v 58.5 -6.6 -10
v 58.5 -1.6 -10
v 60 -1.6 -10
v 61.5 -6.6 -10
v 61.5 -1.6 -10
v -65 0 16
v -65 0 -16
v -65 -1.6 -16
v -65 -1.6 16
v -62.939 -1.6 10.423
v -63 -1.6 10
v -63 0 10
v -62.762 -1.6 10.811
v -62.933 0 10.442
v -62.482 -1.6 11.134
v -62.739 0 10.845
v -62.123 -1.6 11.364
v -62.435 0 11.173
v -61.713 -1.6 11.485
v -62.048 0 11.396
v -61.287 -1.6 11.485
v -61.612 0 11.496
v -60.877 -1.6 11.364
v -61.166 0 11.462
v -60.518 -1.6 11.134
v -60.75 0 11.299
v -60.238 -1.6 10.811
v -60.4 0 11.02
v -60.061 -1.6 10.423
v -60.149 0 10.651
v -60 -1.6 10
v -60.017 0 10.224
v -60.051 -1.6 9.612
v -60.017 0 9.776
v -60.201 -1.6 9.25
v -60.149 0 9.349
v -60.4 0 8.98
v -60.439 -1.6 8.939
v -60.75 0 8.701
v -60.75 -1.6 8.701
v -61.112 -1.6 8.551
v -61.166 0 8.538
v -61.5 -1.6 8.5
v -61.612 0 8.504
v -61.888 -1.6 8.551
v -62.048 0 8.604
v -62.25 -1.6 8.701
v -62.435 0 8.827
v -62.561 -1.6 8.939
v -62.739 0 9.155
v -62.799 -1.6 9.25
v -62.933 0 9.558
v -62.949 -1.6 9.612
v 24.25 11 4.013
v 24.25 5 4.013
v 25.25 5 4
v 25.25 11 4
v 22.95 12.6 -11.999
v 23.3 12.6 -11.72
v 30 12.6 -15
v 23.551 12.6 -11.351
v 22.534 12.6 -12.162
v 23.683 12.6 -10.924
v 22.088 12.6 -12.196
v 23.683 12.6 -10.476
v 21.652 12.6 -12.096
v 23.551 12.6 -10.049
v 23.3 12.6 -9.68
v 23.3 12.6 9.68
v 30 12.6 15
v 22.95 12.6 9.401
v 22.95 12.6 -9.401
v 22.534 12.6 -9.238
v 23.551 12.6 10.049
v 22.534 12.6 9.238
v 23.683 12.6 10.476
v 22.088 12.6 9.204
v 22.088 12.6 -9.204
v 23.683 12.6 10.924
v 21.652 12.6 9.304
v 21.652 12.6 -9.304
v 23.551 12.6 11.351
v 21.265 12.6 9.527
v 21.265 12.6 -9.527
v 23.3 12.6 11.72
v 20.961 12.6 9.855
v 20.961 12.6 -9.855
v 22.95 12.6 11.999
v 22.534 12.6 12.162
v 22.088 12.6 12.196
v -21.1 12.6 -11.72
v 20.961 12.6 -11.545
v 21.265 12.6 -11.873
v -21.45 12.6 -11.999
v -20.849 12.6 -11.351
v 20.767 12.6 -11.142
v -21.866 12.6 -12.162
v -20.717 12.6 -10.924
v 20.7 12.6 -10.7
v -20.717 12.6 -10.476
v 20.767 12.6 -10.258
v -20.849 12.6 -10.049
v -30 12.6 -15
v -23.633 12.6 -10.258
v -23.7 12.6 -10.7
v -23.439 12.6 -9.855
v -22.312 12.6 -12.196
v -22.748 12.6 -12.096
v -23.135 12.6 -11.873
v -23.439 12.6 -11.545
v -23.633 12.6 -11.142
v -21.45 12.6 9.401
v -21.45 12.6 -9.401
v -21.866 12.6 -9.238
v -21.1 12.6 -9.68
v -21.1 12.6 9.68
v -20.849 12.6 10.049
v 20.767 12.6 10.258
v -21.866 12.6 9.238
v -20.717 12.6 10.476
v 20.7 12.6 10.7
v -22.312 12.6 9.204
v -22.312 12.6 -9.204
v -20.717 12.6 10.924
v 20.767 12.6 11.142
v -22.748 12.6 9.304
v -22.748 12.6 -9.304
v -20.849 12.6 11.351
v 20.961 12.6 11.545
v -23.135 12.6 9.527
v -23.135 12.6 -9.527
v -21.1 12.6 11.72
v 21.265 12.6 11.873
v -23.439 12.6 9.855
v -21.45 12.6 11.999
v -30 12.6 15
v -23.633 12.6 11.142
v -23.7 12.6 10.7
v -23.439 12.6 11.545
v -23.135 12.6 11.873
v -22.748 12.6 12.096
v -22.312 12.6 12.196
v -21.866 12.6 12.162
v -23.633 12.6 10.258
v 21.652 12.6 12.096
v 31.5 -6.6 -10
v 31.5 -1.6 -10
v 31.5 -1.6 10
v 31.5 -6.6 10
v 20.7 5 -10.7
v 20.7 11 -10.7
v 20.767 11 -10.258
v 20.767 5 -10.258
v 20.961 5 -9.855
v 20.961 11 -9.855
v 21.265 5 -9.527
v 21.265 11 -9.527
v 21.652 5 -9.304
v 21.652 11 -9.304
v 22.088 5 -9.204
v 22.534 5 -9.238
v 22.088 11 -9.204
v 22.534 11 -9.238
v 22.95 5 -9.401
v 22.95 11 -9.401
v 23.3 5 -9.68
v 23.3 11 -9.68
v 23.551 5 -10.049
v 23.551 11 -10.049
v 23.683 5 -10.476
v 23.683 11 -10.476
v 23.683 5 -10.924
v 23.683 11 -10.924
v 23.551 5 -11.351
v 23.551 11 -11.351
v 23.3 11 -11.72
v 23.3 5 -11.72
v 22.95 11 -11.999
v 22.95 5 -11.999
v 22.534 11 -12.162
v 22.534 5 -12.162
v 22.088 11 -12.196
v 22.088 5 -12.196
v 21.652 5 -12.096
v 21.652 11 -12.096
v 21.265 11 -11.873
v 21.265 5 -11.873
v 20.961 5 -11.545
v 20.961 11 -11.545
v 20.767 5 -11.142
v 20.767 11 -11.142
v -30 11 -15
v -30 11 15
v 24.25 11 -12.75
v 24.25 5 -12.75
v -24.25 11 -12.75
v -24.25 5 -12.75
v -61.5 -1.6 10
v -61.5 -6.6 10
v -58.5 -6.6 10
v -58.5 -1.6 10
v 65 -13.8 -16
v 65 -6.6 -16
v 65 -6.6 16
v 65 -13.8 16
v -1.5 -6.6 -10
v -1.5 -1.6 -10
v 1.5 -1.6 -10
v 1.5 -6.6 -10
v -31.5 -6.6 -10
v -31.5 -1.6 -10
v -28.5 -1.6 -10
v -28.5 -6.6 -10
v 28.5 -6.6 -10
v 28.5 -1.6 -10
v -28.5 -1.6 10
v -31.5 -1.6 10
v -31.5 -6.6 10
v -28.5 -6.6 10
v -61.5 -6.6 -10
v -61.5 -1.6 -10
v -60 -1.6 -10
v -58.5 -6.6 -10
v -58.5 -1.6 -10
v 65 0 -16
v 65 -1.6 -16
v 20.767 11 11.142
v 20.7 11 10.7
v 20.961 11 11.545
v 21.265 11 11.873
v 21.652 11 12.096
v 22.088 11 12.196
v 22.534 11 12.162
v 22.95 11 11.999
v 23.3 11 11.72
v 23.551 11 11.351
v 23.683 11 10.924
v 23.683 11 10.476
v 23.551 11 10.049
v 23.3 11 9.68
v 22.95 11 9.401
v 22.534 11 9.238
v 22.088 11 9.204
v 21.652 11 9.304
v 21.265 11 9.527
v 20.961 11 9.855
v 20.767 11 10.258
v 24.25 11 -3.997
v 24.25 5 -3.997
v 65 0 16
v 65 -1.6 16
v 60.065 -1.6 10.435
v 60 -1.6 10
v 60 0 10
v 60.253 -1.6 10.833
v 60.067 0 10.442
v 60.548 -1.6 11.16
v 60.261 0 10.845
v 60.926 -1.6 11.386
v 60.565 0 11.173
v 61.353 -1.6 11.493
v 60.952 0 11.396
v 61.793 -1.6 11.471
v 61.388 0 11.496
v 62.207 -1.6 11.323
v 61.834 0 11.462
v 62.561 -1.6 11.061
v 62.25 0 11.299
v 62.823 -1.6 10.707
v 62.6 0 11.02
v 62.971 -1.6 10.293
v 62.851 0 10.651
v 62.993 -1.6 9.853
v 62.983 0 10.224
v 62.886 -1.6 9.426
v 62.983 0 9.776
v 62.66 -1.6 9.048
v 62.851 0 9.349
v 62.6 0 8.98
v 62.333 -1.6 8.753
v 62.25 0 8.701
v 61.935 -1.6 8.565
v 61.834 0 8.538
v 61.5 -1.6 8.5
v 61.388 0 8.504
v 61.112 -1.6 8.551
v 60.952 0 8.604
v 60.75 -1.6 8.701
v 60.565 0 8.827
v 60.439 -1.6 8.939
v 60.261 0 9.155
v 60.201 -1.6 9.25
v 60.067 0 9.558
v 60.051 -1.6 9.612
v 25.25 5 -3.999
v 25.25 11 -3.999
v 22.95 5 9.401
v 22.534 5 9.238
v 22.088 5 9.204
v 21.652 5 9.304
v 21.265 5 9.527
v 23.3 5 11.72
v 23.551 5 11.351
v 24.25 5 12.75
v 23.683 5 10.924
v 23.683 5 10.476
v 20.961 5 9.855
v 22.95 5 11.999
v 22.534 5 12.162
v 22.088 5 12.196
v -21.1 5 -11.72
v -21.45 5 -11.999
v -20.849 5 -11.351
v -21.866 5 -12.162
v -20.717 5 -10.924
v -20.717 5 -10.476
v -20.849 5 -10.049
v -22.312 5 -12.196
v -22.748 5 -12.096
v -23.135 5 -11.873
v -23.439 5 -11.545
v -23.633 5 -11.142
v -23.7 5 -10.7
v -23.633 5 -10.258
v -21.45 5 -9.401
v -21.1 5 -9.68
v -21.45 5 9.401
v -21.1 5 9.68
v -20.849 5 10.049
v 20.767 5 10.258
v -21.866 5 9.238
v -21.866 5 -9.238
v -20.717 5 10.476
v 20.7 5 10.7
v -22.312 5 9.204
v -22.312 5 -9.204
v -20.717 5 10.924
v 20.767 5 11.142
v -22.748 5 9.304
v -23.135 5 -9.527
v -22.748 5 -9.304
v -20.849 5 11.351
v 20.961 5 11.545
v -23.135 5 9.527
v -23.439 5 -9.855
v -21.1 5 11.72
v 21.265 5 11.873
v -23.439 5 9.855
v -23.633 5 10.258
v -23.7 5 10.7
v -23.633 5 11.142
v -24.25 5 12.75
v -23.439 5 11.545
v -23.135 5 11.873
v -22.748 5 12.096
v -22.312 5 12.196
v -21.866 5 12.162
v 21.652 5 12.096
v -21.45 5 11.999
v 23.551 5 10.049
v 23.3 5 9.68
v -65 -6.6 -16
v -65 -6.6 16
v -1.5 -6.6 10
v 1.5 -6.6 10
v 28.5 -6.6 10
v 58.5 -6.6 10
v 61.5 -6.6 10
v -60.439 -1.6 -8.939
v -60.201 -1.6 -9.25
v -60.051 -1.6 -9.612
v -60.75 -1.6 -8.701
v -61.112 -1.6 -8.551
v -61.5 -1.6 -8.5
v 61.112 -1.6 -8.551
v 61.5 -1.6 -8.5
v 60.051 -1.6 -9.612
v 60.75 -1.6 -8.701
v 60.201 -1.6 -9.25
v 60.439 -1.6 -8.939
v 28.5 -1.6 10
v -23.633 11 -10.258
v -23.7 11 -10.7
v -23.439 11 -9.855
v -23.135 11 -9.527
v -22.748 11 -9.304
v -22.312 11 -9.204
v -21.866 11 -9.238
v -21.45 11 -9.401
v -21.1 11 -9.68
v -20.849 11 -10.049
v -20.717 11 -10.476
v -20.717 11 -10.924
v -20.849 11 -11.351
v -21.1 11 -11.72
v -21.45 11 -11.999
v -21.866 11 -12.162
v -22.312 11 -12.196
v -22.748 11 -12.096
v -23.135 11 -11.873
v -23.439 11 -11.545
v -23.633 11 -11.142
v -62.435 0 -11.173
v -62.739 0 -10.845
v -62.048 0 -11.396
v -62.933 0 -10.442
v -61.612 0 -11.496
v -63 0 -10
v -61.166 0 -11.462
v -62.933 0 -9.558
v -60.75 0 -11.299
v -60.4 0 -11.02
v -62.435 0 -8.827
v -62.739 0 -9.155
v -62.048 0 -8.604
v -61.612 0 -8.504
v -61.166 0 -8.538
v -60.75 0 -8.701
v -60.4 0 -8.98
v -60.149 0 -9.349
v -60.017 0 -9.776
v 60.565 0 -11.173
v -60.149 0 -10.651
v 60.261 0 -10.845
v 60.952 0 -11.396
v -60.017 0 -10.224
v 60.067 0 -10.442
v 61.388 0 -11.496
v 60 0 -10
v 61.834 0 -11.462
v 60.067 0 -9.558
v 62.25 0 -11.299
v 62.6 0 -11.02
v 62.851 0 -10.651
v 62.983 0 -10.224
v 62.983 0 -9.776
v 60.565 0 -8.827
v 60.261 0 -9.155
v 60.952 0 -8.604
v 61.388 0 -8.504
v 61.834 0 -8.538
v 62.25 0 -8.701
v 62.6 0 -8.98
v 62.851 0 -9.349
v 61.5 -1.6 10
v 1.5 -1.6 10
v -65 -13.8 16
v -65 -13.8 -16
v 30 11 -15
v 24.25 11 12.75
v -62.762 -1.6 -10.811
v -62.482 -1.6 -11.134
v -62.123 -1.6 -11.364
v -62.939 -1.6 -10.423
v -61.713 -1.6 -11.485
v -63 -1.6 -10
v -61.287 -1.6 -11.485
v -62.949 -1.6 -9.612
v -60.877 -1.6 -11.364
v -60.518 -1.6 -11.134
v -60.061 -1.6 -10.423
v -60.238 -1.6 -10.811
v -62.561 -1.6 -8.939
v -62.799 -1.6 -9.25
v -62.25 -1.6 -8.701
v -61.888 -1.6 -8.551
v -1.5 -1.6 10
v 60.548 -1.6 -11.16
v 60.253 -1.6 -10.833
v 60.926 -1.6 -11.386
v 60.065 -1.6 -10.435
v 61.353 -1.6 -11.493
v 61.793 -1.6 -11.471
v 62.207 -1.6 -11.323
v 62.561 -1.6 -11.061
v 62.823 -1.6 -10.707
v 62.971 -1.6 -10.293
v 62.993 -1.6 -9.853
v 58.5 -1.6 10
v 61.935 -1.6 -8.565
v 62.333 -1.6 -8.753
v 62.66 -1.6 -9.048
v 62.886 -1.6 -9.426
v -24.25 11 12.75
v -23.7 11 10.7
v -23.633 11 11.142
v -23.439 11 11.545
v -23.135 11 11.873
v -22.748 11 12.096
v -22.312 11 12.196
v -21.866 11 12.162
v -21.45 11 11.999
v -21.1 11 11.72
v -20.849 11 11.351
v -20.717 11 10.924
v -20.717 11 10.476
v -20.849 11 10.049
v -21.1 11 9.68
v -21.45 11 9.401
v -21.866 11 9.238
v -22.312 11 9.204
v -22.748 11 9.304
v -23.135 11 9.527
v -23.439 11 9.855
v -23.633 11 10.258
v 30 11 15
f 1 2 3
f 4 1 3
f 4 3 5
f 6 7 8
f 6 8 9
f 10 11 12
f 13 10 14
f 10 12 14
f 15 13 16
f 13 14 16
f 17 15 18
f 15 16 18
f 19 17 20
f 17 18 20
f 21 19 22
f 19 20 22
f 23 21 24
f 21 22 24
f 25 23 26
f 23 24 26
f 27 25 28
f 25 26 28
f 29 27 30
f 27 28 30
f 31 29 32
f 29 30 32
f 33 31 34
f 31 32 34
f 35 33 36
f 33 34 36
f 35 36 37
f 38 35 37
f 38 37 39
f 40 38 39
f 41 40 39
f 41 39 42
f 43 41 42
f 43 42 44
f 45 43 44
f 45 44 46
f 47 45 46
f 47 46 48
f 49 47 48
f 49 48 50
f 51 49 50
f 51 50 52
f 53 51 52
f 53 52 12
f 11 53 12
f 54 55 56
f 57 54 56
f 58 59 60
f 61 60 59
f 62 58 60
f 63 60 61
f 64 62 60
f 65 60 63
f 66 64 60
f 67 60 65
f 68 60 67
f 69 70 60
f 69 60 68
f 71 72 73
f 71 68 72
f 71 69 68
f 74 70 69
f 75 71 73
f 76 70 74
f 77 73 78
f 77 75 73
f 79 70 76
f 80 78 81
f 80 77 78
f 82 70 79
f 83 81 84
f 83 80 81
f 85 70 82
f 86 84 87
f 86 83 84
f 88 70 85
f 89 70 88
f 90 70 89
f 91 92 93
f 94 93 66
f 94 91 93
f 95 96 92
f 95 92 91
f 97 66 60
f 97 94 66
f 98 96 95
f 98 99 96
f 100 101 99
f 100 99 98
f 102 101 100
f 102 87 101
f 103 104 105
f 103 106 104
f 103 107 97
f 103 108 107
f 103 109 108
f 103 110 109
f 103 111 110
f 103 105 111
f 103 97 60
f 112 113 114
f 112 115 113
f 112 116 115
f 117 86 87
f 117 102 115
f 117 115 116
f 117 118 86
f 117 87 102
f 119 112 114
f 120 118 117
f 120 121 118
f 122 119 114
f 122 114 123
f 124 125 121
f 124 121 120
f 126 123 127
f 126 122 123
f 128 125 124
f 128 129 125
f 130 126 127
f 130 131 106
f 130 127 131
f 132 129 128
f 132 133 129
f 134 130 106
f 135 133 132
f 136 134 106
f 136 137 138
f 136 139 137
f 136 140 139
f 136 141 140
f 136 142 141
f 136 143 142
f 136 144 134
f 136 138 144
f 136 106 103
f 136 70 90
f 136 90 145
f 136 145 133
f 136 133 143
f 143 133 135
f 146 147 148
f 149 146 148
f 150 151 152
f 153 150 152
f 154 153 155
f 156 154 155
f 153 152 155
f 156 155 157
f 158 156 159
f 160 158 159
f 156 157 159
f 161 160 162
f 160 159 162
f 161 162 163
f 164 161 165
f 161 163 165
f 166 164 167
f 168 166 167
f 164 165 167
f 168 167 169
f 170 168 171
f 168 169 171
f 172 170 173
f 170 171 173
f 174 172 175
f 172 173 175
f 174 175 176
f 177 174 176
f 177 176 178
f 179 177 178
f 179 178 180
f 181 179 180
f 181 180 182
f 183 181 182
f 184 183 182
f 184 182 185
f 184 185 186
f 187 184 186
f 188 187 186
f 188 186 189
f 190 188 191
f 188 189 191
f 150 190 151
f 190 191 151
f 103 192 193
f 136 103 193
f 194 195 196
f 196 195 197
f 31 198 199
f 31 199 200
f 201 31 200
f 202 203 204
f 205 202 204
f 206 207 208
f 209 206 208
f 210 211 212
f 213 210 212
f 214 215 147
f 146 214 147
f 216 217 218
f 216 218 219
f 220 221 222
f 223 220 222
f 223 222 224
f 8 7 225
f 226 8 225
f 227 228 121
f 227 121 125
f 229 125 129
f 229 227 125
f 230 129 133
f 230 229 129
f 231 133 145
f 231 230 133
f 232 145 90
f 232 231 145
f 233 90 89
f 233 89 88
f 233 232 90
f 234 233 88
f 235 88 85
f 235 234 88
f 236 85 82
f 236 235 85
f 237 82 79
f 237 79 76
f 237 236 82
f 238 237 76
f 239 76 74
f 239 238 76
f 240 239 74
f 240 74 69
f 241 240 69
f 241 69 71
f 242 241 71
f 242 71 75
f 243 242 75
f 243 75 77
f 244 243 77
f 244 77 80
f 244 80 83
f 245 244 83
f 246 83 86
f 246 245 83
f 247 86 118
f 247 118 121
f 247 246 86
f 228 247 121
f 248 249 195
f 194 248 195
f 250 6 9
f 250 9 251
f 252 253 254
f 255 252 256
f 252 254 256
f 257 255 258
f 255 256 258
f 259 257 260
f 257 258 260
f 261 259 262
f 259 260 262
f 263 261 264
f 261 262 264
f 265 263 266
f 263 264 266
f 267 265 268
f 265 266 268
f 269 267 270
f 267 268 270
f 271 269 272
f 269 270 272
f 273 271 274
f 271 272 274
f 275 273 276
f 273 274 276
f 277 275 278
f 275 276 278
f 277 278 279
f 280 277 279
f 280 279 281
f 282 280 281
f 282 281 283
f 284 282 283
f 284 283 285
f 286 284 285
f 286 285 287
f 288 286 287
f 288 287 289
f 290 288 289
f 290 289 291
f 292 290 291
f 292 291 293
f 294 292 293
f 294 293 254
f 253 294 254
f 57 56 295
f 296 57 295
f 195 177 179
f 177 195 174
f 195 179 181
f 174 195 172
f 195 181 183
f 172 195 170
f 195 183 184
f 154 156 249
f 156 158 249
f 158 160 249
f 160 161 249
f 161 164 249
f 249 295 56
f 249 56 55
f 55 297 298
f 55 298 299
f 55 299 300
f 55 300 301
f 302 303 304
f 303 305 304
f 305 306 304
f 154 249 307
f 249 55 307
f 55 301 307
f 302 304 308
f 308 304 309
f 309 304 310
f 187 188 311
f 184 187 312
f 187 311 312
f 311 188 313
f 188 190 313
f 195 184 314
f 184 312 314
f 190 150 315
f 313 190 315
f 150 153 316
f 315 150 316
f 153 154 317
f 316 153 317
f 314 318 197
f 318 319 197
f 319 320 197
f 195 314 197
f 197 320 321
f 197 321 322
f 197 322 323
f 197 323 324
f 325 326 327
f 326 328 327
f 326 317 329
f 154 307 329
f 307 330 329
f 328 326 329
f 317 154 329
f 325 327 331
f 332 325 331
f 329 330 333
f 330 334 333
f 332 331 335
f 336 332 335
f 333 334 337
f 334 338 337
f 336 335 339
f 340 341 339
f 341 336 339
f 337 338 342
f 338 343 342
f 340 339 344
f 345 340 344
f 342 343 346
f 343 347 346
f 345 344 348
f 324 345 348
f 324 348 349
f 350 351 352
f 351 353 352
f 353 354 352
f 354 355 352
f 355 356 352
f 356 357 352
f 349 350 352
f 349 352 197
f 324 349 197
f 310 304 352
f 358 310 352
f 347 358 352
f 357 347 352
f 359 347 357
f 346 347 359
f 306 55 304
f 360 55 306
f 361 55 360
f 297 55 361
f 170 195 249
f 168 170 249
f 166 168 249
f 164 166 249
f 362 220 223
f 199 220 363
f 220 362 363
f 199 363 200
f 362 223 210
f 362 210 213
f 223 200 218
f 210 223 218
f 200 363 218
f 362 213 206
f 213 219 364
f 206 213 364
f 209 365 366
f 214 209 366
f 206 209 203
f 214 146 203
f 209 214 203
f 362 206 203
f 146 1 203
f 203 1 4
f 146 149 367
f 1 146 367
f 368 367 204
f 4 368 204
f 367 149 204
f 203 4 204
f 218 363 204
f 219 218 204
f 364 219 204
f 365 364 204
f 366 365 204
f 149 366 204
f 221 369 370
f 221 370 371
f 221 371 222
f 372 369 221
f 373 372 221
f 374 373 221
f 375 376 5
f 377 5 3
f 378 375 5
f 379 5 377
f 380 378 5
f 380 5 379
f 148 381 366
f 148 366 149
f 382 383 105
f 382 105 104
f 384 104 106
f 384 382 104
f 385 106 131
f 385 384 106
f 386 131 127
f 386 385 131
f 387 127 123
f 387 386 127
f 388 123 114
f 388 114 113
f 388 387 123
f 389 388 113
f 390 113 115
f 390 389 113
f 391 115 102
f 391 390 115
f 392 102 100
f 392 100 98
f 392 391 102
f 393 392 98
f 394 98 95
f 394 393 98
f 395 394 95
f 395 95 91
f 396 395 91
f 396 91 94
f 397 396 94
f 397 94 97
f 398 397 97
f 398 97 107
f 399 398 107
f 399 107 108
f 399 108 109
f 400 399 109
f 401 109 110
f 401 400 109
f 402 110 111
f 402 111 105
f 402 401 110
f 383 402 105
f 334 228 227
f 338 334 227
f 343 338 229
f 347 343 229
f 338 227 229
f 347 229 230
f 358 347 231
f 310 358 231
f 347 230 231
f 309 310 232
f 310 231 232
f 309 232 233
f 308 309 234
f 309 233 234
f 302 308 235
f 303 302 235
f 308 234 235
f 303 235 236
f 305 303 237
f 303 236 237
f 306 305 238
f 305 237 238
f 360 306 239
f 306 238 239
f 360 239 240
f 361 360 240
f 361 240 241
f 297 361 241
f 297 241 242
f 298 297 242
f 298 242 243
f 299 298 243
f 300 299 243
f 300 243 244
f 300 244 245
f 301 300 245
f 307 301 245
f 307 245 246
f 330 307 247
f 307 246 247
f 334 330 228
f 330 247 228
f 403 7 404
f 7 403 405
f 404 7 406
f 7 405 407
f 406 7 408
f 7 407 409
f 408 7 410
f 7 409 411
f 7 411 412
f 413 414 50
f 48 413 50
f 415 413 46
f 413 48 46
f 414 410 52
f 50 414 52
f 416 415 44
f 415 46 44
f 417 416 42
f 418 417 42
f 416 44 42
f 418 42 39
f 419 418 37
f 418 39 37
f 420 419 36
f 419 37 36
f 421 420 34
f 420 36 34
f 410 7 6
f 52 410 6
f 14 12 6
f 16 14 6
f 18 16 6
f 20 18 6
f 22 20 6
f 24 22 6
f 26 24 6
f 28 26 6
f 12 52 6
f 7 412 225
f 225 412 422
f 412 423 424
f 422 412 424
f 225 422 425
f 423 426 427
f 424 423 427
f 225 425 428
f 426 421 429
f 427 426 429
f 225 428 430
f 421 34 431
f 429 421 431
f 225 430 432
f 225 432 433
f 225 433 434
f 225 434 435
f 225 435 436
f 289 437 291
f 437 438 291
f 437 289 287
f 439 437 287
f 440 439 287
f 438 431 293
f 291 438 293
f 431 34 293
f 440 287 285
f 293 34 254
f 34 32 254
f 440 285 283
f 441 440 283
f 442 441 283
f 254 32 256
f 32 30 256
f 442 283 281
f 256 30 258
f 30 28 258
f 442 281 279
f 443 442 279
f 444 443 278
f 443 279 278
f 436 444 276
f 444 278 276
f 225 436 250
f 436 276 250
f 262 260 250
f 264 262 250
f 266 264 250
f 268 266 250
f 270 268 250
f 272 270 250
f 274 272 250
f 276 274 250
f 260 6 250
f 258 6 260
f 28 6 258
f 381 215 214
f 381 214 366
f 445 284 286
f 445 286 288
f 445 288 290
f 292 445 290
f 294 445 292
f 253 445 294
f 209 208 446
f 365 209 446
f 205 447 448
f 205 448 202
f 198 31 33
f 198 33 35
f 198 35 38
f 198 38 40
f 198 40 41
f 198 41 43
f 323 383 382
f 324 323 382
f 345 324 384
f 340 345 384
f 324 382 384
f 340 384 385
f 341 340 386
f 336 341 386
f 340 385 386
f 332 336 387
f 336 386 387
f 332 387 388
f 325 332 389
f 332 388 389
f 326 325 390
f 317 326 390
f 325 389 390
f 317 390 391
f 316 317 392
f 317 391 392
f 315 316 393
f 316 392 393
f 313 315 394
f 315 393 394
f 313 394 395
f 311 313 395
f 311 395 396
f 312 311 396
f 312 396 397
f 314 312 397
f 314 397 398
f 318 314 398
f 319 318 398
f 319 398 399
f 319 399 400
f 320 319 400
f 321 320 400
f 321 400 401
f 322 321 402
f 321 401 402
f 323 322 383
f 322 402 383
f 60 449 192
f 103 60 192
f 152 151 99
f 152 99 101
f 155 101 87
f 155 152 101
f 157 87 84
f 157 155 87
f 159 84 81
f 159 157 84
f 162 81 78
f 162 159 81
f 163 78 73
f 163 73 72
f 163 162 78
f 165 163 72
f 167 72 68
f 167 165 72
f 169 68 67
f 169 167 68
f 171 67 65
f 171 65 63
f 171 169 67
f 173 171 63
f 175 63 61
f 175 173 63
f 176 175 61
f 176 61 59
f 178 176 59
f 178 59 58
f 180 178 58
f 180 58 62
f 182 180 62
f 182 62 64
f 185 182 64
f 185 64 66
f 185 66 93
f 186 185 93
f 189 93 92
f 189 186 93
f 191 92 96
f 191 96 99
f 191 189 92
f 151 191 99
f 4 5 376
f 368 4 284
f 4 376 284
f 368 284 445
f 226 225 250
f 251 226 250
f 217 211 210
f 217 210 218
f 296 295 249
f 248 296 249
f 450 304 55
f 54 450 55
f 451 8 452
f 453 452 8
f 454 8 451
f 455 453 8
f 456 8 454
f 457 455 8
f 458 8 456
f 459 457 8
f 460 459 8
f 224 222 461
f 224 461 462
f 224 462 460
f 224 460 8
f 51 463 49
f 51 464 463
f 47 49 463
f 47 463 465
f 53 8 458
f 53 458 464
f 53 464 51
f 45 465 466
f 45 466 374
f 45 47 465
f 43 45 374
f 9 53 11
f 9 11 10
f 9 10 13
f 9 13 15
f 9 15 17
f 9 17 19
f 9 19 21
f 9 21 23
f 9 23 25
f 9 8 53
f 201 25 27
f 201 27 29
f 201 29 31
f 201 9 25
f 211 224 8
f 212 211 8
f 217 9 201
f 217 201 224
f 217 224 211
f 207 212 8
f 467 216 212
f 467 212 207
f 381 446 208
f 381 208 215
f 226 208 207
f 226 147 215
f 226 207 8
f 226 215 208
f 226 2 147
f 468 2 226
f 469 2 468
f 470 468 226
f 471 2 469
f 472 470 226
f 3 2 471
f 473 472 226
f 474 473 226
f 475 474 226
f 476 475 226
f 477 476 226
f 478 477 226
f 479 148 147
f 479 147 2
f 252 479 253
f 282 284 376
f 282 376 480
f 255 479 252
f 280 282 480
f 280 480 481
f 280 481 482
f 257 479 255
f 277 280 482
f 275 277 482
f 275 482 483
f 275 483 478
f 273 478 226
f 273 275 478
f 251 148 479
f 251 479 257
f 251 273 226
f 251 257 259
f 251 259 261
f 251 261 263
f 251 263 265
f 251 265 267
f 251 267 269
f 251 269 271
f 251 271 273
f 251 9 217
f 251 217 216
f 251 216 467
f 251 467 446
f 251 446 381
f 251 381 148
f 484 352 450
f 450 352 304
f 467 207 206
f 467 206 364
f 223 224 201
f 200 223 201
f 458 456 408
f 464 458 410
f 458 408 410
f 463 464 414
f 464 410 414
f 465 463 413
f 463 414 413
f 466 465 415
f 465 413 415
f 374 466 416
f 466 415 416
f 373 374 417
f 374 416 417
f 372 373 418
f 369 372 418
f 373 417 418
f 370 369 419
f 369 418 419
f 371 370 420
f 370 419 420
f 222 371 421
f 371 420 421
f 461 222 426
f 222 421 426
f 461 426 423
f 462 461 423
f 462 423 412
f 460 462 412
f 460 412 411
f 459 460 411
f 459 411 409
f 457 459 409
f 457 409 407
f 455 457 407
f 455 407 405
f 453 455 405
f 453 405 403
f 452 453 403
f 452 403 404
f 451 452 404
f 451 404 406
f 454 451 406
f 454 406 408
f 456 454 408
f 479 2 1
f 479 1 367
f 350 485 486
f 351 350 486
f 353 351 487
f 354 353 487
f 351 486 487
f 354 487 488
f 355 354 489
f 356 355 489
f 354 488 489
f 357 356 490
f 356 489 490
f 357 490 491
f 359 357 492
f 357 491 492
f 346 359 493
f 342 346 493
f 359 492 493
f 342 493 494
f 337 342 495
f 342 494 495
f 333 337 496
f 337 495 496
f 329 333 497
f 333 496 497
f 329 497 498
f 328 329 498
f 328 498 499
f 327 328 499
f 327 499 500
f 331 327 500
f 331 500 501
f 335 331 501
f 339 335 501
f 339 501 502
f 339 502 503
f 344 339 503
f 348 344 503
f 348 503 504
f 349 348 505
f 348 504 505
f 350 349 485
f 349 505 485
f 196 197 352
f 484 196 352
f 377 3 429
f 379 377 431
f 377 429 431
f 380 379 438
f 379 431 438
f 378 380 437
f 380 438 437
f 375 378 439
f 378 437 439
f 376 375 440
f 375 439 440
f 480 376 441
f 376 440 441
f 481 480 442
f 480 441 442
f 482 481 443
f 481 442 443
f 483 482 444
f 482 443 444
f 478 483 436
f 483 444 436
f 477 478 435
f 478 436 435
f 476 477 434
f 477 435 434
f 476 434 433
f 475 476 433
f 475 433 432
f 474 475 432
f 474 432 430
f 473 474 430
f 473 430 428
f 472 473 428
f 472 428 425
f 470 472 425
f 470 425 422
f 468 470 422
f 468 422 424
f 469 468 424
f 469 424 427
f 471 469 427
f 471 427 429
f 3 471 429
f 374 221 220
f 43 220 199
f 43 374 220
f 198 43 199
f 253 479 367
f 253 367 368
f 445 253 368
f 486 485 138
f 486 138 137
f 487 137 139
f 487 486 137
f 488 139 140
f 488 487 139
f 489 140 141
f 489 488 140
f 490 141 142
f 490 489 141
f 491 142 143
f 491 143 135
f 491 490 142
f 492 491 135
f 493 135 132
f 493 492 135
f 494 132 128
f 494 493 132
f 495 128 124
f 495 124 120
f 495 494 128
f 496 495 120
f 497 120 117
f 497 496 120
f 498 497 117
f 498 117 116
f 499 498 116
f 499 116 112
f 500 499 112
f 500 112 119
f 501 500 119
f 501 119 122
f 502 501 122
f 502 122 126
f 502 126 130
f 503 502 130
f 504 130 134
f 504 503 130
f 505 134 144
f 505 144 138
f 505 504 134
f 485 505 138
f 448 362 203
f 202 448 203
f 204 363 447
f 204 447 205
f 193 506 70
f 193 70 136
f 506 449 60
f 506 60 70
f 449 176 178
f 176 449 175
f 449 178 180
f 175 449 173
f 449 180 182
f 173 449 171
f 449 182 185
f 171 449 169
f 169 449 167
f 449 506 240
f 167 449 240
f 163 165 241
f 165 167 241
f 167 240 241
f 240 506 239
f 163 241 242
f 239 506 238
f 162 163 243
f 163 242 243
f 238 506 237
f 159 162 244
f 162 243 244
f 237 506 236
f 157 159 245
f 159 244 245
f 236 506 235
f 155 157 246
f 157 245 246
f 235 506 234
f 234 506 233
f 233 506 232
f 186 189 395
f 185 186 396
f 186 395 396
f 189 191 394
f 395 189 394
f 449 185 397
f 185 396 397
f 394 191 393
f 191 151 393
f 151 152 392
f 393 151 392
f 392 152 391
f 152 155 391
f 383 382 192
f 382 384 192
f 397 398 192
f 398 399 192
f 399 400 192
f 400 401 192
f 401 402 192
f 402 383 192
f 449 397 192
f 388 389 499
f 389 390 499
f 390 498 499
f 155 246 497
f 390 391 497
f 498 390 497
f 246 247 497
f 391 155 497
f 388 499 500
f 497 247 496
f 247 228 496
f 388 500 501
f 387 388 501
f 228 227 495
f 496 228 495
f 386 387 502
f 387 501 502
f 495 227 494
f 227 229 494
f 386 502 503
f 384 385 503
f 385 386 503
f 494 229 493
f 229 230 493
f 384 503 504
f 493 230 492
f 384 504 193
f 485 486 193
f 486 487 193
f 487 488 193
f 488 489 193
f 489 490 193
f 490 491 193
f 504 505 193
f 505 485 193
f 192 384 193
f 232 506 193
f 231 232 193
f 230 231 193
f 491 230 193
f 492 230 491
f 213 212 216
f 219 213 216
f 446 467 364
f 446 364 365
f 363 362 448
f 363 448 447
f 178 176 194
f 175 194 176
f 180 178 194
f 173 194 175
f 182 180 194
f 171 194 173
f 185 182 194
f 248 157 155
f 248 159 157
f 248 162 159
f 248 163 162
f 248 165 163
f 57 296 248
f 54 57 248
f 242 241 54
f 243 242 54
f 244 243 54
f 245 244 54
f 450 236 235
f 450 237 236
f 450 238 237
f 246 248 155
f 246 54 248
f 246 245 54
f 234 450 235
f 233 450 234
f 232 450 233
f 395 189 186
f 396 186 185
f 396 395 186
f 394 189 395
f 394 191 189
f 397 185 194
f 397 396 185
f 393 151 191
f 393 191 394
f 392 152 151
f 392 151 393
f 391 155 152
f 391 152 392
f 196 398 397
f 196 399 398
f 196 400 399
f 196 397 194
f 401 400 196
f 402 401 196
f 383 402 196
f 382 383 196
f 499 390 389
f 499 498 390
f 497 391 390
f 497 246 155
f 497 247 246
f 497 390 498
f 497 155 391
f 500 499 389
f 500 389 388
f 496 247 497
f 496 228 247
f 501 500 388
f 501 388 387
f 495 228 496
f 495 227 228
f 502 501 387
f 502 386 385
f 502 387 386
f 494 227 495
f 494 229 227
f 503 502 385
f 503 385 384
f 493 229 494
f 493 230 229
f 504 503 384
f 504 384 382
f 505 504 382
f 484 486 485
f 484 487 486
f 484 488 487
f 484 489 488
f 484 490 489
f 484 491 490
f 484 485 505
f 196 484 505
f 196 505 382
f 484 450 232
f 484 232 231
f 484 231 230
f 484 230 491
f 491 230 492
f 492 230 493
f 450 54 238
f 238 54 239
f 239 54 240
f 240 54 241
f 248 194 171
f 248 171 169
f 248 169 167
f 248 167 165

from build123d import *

# Parameters (mm, degrees)
F0_W      = 130
F0_H      = 32
F1_DEPTH  = 1.6
F2_W      = 3
F2_H      = 20
F3_DEPTH  = 5
F5_W      = 130
F5_H      = 32
F6_DEPTH  = 7.2
F7_R      = 1.5
F8_DEPTH  = 1.6
F12_DEPTH = 6
F13_R     = 1.5
F14_DEPTH = 6
F15_W     = 60
F15_H     = 30
F15_R     = 1.5
F16_DEPTH = 1.6


with BuildPart() as f1:
    # F0 (on Front) → F1 (new body)
    with BuildSketch(Plane.XZ):
        Rectangle(F0_W, F0_H)
    extrude(amount=F1_DEPTH)

    # F2 (on face) → F3 (join)
    with BuildSketch(Plane.XZ.offset(1.6)):
        Rectangle(F2_W, F2_H)
        with Locations((-60, 0)):
            Rectangle(F2_W, F2_H)
        with Locations((-30, 0)):
            Rectangle(F2_W, F2_H)
        with Locations((30, 0)):
            Rectangle(F2_W, F2_H)
        with Locations((60, 0)):
            Rectangle(F2_W, F2_H)
    extrude(amount=F3_DEPTH)

    # F5 (on offset) → F6 (join)
    with BuildSketch(Plane.XZ.offset(6.6)):
        Rectangle(F5_W, F5_H)
    extrude(amount=F6_DEPTH)

    # F7 (on face) → F8 (cut, through all)
    with BuildSketch(Plane(origin=(0, 0, 0), x_dir=(-1, 0, 0), z_dir=(0, 1, 0))):
        with Locations((61.5, 10)):
            Circle(F7_R)
        with Locations((61.5, -10)):
            Circle(F7_R)
        with Locations((-61.5, 10)):
            Circle(F7_R)
        with Locations((-61.5, -10)):
            Circle(F7_R)
    extrude(amount=-F8_DEPTH, mode=Mode.SUBTRACT)


with BuildPart() as f12:
    # F11 (on offset) → F12 (new body)
    with BuildSketch(Plane(origin=(0, 5, 0), x_dir=(-1, 0, 0), z_dir=(0, 1, 0))):
        Polygon((24.25, -12.75), (24.25, 12.75), (-24.25, 12.75), (-24.25, 4.0126102977), (-25.25, 4), (-25.25, -3.9990916737), (-24.25, -3.9973747328), (-24.25, -12.75), align=None)
    extrude(amount=F12_DEPTH)

    # F13 (on face) → F14 (cut, through all)
    with BuildSketch(Plane(origin=(0, 11, 0), x_dir=(-1, 0, 0), z_dir=(0, 1, 0))):
        with Locations((-22.2, 10.7)):
            Circle(F13_R)
        with Locations((-22.2, -10.7)):
            Circle(F13_R)
        with Locations((22.2, -10.7)):
            Circle(F13_R)
        with Locations((22.2, 10.7)):
            Circle(F13_R)
    extrude(amount=-F14_DEPTH, mode=Mode.SUBTRACT)


with BuildPart() as f16:
    # F15 (on face) → F16 (new body)
    with BuildSketch(Plane(origin=(0, 11, 0), x_dir=(-1, 0, 0), z_dir=(0, 1, 0))):
        Rectangle(F15_W, F15_H)
        Polygon((-24.25, -12.75), (-24.25, -3.9973747328), (-25.25, -3.9990916737), (-25.25, 4), (-24.25, 4.0126102977), (-24.25, 12.75), (24.25, 12.75), (24.25, -12.75), align=None, mode=Mode.SUBTRACT)
        Polygon((-25.25, -3.9990916737), (-24.25, -3.9973747328), (-24.25, -12.75), (24.25, -12.75), (24.25, 12.75), (-24.25, 12.75), (-24.25, 4.0126102977), (-25.25, 4), align=None)
        with Locations((-22.2, -10.7)):
            Circle(F15_R, mode=Mode.SUBTRACT)
        with Locations((22.2, -10.7)):
            Circle(F15_R, mode=Mode.SUBTRACT)
        with Locations((-22.2, 10.7)):
            Circle(F15_R, mode=Mode.SUBTRACT)
        with Locations((22.2, 10.7)):
            Circle(F15_R, mode=Mode.SUBTRACT)
    extrude(amount=F16_DEPTH)


solid = Compound([f1.part, f12.part, f16.part])
